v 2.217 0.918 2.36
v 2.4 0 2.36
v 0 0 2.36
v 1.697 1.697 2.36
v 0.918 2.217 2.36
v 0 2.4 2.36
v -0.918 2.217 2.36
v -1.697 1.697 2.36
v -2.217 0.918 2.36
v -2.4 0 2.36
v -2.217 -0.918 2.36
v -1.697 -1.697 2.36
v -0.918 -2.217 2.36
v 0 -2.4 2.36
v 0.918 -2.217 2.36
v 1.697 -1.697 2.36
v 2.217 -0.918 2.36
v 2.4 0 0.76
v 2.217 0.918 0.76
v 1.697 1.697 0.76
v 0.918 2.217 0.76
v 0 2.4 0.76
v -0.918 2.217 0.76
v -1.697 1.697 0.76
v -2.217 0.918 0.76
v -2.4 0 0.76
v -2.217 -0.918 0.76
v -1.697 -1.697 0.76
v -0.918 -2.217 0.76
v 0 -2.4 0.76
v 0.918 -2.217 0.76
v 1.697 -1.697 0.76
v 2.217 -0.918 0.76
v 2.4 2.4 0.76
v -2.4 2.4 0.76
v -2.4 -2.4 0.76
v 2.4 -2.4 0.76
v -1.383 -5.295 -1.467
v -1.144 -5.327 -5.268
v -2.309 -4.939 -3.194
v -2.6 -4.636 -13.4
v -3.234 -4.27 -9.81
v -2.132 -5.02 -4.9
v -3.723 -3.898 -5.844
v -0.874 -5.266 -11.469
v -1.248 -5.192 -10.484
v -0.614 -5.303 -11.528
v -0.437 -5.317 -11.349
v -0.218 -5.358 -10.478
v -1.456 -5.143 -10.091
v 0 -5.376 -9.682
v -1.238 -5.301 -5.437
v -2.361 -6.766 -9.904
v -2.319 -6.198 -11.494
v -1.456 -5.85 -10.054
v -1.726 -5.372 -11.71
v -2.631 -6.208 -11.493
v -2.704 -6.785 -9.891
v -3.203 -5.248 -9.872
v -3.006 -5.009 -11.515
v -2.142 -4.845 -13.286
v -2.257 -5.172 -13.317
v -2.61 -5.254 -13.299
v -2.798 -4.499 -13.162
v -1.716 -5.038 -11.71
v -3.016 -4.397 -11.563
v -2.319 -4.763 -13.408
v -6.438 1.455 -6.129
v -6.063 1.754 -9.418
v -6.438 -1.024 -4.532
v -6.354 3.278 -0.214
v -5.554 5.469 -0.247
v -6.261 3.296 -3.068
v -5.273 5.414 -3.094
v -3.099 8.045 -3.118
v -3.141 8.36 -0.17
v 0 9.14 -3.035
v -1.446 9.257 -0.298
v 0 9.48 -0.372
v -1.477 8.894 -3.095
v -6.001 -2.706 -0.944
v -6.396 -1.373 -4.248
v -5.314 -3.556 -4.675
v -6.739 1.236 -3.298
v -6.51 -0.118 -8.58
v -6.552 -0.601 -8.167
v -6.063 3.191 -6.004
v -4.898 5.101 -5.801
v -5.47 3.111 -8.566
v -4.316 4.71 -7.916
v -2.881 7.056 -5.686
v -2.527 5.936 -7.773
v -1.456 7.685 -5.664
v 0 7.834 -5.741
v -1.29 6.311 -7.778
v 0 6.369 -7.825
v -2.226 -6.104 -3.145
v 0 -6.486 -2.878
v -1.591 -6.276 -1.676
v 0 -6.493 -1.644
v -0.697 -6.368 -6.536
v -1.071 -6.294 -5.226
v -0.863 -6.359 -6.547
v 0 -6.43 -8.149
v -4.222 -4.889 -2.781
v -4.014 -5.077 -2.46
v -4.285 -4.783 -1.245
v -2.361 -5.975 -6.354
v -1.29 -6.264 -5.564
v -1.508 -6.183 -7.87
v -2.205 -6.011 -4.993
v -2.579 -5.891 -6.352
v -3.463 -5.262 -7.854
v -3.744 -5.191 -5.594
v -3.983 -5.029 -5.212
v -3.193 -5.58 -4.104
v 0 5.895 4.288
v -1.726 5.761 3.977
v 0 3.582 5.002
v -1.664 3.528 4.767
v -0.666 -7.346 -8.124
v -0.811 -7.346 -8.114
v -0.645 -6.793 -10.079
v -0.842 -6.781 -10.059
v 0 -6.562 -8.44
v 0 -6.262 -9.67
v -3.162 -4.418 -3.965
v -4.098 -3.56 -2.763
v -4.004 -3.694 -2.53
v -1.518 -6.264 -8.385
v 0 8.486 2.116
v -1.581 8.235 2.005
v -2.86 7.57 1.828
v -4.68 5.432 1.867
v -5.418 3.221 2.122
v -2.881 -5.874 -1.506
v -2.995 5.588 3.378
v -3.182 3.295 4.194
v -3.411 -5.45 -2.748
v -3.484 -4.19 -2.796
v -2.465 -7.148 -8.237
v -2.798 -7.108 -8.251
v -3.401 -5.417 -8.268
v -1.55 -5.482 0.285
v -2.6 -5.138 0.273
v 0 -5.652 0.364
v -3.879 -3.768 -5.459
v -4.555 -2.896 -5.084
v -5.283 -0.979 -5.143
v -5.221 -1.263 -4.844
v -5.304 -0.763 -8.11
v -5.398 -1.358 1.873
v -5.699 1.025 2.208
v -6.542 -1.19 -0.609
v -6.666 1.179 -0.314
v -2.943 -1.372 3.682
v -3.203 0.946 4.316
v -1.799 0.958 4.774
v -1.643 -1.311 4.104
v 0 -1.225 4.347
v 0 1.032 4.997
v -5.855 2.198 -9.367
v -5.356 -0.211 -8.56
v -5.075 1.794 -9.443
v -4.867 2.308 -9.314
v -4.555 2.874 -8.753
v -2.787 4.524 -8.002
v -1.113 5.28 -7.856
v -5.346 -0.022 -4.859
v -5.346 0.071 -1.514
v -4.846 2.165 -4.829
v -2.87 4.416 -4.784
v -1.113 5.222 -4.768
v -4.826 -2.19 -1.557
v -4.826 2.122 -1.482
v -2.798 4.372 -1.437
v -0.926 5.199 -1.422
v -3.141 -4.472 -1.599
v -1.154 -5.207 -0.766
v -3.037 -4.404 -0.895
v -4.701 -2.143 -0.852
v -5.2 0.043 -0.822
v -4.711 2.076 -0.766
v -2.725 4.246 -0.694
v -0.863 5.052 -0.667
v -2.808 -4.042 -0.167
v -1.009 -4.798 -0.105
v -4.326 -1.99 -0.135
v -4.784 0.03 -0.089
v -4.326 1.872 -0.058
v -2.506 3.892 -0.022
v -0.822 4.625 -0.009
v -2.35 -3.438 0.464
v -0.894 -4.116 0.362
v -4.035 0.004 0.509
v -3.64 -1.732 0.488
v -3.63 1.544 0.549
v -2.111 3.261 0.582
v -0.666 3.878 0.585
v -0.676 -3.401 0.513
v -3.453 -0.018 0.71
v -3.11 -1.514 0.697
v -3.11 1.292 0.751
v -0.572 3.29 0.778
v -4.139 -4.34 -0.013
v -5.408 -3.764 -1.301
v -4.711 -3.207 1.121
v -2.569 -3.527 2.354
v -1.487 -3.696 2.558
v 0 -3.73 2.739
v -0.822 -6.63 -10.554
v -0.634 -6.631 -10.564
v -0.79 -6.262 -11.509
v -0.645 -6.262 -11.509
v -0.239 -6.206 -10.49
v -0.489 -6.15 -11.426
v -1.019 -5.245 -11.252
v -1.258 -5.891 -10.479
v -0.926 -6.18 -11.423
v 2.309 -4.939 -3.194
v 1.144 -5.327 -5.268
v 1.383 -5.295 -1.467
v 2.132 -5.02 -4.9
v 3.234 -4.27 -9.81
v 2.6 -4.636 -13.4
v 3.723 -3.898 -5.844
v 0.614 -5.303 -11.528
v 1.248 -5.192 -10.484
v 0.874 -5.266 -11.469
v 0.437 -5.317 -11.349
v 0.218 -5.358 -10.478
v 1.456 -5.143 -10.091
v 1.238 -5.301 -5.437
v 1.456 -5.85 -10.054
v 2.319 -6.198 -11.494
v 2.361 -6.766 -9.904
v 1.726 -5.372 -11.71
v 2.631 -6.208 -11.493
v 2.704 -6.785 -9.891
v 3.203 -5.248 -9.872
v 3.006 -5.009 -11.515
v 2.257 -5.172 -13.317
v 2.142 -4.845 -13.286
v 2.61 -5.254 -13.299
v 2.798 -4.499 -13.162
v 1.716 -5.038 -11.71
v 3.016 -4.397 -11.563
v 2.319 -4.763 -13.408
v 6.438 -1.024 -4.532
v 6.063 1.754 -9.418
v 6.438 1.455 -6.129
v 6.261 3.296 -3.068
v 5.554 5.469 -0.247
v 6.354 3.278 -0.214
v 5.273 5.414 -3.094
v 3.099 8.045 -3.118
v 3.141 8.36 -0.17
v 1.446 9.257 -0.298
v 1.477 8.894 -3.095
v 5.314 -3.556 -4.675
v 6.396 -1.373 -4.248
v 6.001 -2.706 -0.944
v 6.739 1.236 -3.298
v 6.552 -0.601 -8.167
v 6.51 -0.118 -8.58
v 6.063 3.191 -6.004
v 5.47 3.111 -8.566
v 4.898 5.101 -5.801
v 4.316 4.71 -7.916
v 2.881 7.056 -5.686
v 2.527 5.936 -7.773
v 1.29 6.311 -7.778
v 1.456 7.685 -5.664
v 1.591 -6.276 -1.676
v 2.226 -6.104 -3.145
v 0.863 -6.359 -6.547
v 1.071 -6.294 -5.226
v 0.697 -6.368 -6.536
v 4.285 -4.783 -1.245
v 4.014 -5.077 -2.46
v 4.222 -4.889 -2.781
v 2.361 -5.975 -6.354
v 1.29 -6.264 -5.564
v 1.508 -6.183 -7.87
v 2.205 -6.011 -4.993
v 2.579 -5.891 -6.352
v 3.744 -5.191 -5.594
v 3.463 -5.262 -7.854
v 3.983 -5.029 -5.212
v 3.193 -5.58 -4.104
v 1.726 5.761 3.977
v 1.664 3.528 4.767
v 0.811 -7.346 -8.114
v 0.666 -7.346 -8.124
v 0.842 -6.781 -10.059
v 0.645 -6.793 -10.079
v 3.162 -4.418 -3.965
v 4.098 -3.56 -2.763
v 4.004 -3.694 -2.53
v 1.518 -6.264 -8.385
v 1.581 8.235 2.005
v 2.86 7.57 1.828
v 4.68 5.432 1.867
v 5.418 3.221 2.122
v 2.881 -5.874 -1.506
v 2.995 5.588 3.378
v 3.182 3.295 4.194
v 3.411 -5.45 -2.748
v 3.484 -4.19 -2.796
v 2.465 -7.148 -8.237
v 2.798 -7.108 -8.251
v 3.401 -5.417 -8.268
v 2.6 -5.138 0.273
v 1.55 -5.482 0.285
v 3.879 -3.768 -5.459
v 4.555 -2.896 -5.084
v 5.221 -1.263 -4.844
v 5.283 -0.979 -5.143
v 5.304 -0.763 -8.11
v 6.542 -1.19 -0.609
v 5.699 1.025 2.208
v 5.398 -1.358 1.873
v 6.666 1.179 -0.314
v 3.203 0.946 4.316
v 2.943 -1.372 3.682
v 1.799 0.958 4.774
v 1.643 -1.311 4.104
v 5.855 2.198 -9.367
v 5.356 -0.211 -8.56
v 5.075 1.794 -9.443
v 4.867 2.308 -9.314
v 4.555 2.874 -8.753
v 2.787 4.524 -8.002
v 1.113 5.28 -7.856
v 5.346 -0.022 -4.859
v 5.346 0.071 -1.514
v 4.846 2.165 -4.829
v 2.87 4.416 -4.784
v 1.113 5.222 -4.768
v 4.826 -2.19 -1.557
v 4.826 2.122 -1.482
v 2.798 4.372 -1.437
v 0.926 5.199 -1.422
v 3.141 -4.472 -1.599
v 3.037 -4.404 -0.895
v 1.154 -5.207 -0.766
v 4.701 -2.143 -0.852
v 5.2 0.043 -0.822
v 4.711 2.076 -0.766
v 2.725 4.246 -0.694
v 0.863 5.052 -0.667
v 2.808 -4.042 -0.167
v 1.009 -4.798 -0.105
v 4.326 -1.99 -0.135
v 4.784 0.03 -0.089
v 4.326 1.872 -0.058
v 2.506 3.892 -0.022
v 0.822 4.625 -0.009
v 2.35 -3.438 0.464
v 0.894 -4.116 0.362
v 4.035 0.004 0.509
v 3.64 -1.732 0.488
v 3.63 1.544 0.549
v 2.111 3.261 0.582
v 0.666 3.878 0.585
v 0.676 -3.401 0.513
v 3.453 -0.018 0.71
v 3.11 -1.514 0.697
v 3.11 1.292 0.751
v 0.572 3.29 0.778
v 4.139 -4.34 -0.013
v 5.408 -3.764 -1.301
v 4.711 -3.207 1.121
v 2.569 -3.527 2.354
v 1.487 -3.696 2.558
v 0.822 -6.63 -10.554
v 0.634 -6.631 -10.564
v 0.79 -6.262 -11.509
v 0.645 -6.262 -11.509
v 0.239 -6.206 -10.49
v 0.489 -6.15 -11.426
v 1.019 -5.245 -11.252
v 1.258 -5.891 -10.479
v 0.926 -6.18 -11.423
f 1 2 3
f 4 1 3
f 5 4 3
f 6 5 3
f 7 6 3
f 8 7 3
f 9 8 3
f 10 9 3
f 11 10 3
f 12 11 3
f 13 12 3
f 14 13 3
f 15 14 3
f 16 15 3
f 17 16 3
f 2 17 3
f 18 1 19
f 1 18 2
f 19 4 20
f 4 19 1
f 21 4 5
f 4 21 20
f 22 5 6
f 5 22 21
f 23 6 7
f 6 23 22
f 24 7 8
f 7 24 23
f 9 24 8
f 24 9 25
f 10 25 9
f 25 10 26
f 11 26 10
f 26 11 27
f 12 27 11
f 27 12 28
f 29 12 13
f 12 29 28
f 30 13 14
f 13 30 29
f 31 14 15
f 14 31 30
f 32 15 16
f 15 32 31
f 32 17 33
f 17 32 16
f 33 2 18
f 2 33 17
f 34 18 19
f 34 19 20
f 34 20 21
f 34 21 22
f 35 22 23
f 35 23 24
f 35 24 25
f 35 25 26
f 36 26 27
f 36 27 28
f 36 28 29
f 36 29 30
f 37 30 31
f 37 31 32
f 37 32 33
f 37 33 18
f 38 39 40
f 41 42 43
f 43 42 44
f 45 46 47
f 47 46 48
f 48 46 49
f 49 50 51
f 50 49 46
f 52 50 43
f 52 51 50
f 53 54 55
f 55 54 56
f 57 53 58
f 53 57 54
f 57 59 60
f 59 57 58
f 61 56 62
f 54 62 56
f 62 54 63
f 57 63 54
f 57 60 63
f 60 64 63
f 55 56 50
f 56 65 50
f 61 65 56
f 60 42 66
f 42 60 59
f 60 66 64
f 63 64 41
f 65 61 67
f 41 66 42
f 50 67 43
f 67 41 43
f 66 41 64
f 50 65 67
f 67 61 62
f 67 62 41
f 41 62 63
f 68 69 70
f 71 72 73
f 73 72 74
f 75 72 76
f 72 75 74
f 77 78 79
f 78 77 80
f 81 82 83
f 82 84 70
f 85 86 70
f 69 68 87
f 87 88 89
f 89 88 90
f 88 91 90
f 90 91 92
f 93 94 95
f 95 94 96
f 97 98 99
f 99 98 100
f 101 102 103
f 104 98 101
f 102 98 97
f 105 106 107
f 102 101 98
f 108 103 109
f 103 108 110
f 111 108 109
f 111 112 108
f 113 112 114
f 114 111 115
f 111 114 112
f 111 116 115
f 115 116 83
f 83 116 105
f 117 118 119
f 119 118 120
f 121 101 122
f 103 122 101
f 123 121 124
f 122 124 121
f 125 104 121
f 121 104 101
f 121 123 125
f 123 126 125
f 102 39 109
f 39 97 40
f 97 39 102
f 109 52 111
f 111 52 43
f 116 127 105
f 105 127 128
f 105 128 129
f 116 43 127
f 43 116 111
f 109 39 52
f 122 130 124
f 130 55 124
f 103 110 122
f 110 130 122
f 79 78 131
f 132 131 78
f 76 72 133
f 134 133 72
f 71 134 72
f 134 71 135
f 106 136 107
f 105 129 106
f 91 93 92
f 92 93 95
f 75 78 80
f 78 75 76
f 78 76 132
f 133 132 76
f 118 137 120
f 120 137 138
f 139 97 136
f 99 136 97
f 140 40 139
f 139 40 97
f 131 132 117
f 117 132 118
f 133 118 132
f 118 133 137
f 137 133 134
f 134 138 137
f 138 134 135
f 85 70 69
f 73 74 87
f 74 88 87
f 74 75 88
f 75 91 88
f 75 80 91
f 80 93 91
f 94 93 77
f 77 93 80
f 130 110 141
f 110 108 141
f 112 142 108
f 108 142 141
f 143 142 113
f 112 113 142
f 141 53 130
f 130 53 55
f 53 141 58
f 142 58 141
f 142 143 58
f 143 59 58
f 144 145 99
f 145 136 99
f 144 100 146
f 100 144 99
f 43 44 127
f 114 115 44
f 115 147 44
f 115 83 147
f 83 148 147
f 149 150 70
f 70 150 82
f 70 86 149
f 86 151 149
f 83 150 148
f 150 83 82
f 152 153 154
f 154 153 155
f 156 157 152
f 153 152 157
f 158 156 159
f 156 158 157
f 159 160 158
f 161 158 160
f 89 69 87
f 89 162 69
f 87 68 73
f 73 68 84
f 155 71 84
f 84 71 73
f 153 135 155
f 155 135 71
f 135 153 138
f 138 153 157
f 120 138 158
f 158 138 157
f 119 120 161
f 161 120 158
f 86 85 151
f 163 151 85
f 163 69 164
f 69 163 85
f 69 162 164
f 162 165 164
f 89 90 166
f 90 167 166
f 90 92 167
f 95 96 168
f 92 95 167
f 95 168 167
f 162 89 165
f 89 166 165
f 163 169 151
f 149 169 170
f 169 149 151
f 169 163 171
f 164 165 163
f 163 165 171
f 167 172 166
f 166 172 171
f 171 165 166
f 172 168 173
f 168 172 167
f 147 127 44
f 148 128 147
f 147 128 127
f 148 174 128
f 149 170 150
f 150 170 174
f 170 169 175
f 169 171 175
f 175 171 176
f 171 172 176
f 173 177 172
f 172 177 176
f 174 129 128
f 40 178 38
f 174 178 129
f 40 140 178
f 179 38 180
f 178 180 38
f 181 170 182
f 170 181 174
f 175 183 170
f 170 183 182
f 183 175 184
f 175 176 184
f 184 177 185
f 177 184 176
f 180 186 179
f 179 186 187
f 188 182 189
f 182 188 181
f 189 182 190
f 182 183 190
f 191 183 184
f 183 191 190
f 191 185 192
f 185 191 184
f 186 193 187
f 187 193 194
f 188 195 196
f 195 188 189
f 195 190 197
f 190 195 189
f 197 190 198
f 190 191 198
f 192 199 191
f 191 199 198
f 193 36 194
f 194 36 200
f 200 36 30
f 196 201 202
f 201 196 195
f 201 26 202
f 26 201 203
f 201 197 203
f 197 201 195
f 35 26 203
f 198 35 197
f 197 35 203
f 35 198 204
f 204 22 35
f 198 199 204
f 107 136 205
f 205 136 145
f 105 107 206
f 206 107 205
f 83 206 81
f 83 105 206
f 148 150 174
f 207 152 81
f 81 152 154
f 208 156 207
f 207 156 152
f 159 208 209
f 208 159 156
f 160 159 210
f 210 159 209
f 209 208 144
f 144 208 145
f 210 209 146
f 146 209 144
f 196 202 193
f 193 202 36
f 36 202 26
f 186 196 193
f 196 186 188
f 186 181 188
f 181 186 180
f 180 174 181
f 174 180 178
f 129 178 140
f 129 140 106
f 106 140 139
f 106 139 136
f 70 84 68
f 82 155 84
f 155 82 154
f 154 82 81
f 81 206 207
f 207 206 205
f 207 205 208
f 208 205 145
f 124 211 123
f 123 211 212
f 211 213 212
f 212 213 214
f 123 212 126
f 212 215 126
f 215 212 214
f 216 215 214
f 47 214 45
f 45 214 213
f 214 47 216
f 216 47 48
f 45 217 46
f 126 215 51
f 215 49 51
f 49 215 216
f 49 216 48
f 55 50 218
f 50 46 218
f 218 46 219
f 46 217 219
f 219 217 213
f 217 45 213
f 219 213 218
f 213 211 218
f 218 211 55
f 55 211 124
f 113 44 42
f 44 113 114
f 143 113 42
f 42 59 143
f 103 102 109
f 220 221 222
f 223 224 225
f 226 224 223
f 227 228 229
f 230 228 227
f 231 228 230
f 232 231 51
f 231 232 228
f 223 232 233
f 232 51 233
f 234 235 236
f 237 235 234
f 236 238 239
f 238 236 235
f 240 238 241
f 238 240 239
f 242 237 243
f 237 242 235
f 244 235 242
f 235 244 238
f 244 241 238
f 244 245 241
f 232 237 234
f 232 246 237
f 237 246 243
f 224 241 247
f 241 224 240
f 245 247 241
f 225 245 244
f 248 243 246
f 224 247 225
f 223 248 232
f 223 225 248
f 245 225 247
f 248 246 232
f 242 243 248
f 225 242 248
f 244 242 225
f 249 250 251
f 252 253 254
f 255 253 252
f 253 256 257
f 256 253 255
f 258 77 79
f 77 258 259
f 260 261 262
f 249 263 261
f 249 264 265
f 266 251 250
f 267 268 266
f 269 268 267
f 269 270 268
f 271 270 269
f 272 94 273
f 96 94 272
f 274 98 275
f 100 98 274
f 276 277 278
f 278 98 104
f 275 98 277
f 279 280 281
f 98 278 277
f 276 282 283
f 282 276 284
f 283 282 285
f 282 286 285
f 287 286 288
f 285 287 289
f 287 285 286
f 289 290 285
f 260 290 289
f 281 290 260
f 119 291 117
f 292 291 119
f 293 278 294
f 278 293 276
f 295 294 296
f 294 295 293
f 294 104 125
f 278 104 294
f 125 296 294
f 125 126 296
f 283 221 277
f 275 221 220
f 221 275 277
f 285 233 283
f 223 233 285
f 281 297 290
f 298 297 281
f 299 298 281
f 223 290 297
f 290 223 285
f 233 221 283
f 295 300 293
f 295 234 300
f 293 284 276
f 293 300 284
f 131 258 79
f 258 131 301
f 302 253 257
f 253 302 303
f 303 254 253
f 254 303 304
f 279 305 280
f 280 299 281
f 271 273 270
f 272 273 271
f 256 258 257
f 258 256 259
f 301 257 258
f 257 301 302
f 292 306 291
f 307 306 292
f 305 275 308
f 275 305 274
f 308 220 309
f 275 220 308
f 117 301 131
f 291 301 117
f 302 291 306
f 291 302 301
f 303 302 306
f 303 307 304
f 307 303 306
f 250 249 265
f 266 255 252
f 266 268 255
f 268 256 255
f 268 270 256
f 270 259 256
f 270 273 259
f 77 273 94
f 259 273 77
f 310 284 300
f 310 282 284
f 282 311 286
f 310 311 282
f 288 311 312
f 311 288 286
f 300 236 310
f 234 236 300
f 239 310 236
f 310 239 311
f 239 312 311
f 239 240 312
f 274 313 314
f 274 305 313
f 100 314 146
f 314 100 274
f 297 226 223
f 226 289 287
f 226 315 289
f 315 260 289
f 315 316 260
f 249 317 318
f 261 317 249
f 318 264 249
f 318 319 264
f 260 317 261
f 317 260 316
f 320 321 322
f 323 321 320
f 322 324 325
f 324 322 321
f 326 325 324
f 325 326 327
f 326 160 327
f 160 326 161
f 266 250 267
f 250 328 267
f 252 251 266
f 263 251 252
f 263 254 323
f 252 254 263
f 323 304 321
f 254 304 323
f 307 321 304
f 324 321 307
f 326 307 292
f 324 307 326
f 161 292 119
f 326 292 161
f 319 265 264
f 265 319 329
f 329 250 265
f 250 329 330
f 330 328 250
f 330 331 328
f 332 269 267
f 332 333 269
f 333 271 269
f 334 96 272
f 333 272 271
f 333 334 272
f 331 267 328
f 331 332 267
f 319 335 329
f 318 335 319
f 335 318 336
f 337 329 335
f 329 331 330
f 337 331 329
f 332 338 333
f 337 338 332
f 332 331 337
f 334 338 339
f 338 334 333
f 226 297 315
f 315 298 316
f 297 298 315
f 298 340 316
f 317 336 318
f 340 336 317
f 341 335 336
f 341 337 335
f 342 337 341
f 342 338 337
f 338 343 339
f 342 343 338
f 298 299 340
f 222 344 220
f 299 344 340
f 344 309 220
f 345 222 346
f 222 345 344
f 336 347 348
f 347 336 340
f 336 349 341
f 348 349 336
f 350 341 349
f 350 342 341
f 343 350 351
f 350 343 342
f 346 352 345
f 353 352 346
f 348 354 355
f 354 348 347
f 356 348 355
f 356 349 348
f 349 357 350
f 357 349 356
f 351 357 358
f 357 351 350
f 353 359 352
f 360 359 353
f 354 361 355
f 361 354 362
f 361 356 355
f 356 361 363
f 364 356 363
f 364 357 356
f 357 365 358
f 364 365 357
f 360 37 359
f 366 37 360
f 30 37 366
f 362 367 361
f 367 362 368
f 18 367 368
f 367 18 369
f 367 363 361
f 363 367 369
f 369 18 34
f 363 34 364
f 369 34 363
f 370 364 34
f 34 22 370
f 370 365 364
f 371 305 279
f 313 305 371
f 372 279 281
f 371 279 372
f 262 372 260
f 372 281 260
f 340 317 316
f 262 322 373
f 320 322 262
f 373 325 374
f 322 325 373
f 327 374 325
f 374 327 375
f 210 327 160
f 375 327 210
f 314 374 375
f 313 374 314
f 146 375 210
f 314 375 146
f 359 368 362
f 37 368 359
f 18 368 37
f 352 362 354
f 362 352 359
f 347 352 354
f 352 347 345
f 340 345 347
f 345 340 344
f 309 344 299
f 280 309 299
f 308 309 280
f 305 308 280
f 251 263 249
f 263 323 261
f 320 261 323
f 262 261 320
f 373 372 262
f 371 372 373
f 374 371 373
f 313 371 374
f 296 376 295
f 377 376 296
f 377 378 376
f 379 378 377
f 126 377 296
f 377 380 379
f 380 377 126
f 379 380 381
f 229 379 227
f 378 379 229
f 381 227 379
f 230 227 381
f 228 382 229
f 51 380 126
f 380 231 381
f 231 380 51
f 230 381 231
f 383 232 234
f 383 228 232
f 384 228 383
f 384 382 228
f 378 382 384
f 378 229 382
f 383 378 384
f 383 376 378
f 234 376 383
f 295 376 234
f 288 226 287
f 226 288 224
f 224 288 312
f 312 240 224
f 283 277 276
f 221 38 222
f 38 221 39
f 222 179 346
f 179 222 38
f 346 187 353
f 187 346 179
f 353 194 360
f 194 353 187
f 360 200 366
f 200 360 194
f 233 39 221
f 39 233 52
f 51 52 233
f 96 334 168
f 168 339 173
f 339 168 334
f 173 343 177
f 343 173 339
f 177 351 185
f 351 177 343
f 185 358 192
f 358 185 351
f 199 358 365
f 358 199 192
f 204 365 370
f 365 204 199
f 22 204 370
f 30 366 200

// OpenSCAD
use <../lib.scad>
use <../p/4-4cylc.scad>
use <../p/4-4ndis.scad>
use <s/85945s01.scad>
$fa=1; $fs=0.2;
function ldraw_lib__85945(realsolid=false) = [
// 0 Minifig Helmet Alien Skull with Fangs
// 0 Name: 85945.dat
// 0 Author: Nils Schmidt [BlackBrick89]
// 0 !LDRAW_ORG Part UPDATE 2012-03
// 0 !LICENSE Licensed under CC BY 2.0 and CC BY 4.0 : see CAreadme.txt
// 
// 0 BFC CERTIFY CCW
  [0,"BFC","CERTIFY"],
  [0,"BFC","CCW"],
// 
// 0 !CATEGORY Minifig Headwear
// 0 !KEYWORDS Space Police III
// 
// 0 !HISTORY 2010-12-31 [PTadmin] Official Update 2010-03
// 0 !HISTORY 2012-12-24 [cwdee] Update category
// 0 !HISTORY 2012-12-28 [PTadmin] Official Update 2012-03
// 
// 
// 0 BFC INVERTNEXT
  [0,"BFC","INVERTNEXT"],
// 1 16 0 -5.9 0 6 0 0 0 4 0 0 0 6 4-4cylc.dat
  [1,16,0,-5.9,0,6,0,0,0,4,0,0,0,6, ldraw_lib__4_4cylc(realsolid)],
// 1 16 0 -1.9 0 6 0 0 0 -1 0 0 0 6 4-4ndis.dat
  [1,16,0,-1.9,0,6,0,0,0,-1,0,0,0,6, ldraw_lib__4_4ndis(realsolid)],
// 
// 1 16 0 0 0 1 0 0 0 1 0 0 0 1 s\85945s01.dat
  [1,16,0,0,0,1,0,0,0,1,0,0,0,1, ldraw_lib__s__85945s01(realsolid)],
// 1 16 0 0 0 -1 0 0 0 1 0 0 0 1 s\85945s01.dat
  [1,16,0,0,0,-1,0,0,0,1,0,0,0,1, ldraw_lib__s__85945s01(realsolid)],
// 
// 4 16 -3.458 3.668 -13.238 3.458 3.668 -13.238 2.86 13.169 -13.317 -2.86 13.169 -13.317
  [4,16,-3.458,3.668,-13.238,3.458,3.668,-13.238,2.86,13.169,-13.317,-2.86,13.169,-13.317],
// 4 16 -2.886 1.914 -13.017 2.886 1.914 -13.017 3.458 3.668 -13.238 -3.458 3.668 -13.238
  [4,16,-2.886,1.914,-13.017,2.886,1.914,-13.017,3.458,3.668,-13.238,-3.458,3.668,-13.238],
// 4 16 2.886 1.914 -13.017 -2.886 1.914 -13.017 -2.522 0.262 -11.996 2.522 0.262 -11.996
  [4,16,2.886,1.914,-13.017,-2.886,1.914,-13.017,-2.522,0.262,-11.996,2.522,0.262,-11.996],
// 4 16 2.522 0.262 -11.996 -2.522 0.262 -11.996 -2.236 -0.906 -10.29 2.236 -0.906 -10.29
  [4,16,2.522,0.262,-11.996,-2.522,0.262,-11.996,-2.236,-0.906,-10.29,2.236,-0.906,-10.29],
// 4 16 -1.69 -1.283 -8.503 1.69 -1.283 -8.503 2.236 -0.906 -10.29 -2.236 -0.906 -10.29
  [4,16,-1.69,-1.283,-8.503,1.69,-1.283,-8.503,2.236,-0.906,-10.29,-2.236,-0.906,-10.29],
// 4 16 3.094 13.593 -13.253 -3.094 13.593 -13.253 -2.86 13.169 -13.317 2.86 13.169 -13.317
  [4,16,3.094,13.593,-13.253,-3.094,13.593,-13.253,-2.86,13.169,-13.317,2.86,13.169,-13.317],
// 3 16 0 24.206 -13.439 -3.094 13.593 -13.253 3.094 13.593 -13.253
  [3,16,0,24.206,-13.439,-3.094,13.593,-13.253,3.094,13.593,-13.253],
// 3 16 0 19.563 15.923 2.782 19.64 13.199 -2.782 19.64 13.199
  [3,16,0,19.563,15.923,2.782,19.64,13.199,-2.782,19.64,13.199],
// 4 16 2.782 11.92 13.054 -2.782 11.92 13.054 -2.782 19.64 13.199 2.782 19.64 13.199
  [4,16,2.782,11.92,13.054,-2.782,11.92,13.054,-2.782,19.64,13.199,2.782,19.64,13.199],
// 4 16 -2.782 11.92 13.054 2.782 11.92 13.054 2.314 3.556 12.998 -2.314 3.556 12.998
  [4,16,-2.782,11.92,13.054,2.782,11.92,13.054,2.314,3.556,12.998,-2.314,3.556,12.998],
// 4 16 2.158 1.667 12.631 -2.158 1.667 12.631 -2.314 3.556 12.998 2.314 3.556 12.998
  [4,16,2.158,1.667,12.631,-2.158,1.667,12.631,-2.314,3.556,12.998,2.314,3.556,12.998],
// 4 16 -2.158 1.667 12.631 2.158 1.667 12.631 2.054 0.023 11.562 -2.054 0.023 11.562
  [4,16,-2.158,1.667,12.631,2.158,1.667,12.631,2.054,0.023,11.562,-2.054,0.023,11.562],
// 4 16 -2.054 0.023 11.562 2.054 0.023 11.562 1.664 -1.463 9.694 -1.664 -1.463 9.694
  [4,16,-2.054,0.023,11.562,2.054,0.023,11.562,1.664,-1.463,9.694,-1.664,-1.463,9.694],
// 4 16 -1.664 -1.463 9.694 1.664 -1.463 9.694 1.43 -1.944 8.225 -1.43 -1.944 8.225
  [4,16,-1.664,-1.463,9.694,1.664,-1.463,9.694,1.43,-1.944,8.225,-1.43,-1.944,8.225],
// 3 16 0 -1.9 6 -1.43 -1.944 8.225 1.43 -1.944 8.225
  [3,16,0,-1.9,6,-1.43,-1.944,8.225,1.43,-1.944,8.225],
// 3 16 0 -1.9 -6 1.69 -1.283 -8.503 -1.69 -1.283 -8.503
  [3,16,0,-1.9,-6,1.69,-1.283,-8.503,-1.69,-1.283,-8.503],
// 
// 5 24 -3.458 3.668 -13.238 3.458 3.668 -13.238 2.86 13.169 -13.317 -2.886 1.914 -13.017
  [5,24,-3.458,3.668,-13.238,3.458,3.668,-13.238,2.86,13.169,-13.317,-2.886,1.914,-13.017],
// 5 24 2.86 13.169 -13.317 -2.86 13.169 -13.317 -3.458 3.668 -13.238 3.094 13.593 -13.253
  [5,24,2.86,13.169,-13.317,-2.86,13.169,-13.317,-3.458,3.668,-13.238,3.094,13.593,-13.253],
// 5 24 -2.886 1.914 -13.017 2.886 1.914 -13.017 3.458 3.668 -13.238 -2.522 0.262 -11.996
  [5,24,-2.886,1.914,-13.017,2.886,1.914,-13.017,3.458,3.668,-13.238,-2.522,0.262,-11.996],
// 5 24 -2.522 0.262 -11.996 2.522 0.262 -11.996 2.886 1.914 -13.017 -2.236 -0.906 -10.29
  [5,24,-2.522,0.262,-11.996,2.522,0.262,-11.996,2.886,1.914,-13.017,-2.236,-0.906,-10.29],
// 5 24 -2.236 -0.906 -10.29 2.236 -0.906 -10.29 2.522 0.262 -11.996 -1.69 -1.283 -8.503
  [5,24,-2.236,-0.906,-10.29,2.236,-0.906,-10.29,2.522,0.262,-11.996,-1.69,-1.283,-8.503],
// 5 24 -1.69 -1.283 -8.503 1.69 -1.283 -8.503 2.236 -0.906 -10.29 0 -1.9 -6
  [5,24,-1.69,-1.283,-8.503,1.69,-1.283,-8.503,2.236,-0.906,-10.29,0,-1.9,-6],
// 5 24 3.094 13.593 -13.253 -3.094 13.593 -13.253 -2.86 13.169 -13.317 0 24.206 -13.439
  [5,24,3.094,13.593,-13.253,-3.094,13.593,-13.253,-2.86,13.169,-13.317,0,24.206,-13.439],
// 2 24 2.782 19.64 13.199 -2.782 19.64 13.199
  [2,24,2.782,19.64,13.199,-2.782,19.64,13.199],
// 5 24 2.782 11.92 13.054 -2.782 11.92 13.054 -2.782 19.64 13.199 2.314 3.556 12.998
  [5,24,2.782,11.92,13.054,-2.782,11.92,13.054,-2.782,19.64,13.199,2.314,3.556,12.998],
// 5 24 2.314 3.556 12.998 -2.314 3.556 12.998 -2.782 11.92 13.054 2.158 1.667 12.631
  [5,24,2.314,3.556,12.998,-2.314,3.556,12.998,-2.782,11.92,13.054,2.158,1.667,12.631],
// 5 24 2.158 1.667 12.631 -2.158 1.667 12.631 -2.314 3.556 12.998 2.054 0.023 11.562
  [5,24,2.158,1.667,12.631,-2.158,1.667,12.631,-2.314,3.556,12.998,2.054,0.023,11.562],
// 5 24 2.054 0.023 11.562 -2.054 0.023 11.562 -2.158 1.667 12.631 1.664 -1.463 9.694
  [5,24,2.054,0.023,11.562,-2.054,0.023,11.562,-2.158,1.667,12.631,1.664,-1.463,9.694],
// 5 24 1.664 -1.463 9.694 -1.664 -1.463 9.694 -2.054 0.023 11.562 1.43 -1.944 8.225
  [5,24,1.664,-1.463,9.694,-1.664,-1.463,9.694,-2.054,0.023,11.562,1.43,-1.944,8.225],
// 5 24 1.43 -1.944 8.225 -1.43 -1.944 8.225 -1.664 -1.463 9.694 0 -1.9 6
  [5,24,1.43,-1.944,8.225,-1.43,-1.944,8.225,-1.664,-1.463,9.694,0,-1.9,6],
];
module ldraw_lib__85945(step=0, col=false, unit=2/5, alt=false, line=0.2, solid=!$preview)
    makepoly(ldraw_lib__85945(solid), step=step, col=col, unit=unit, alt=alt, line=line, solid=solid);
ldraw_lib__85945(line=0.2);
